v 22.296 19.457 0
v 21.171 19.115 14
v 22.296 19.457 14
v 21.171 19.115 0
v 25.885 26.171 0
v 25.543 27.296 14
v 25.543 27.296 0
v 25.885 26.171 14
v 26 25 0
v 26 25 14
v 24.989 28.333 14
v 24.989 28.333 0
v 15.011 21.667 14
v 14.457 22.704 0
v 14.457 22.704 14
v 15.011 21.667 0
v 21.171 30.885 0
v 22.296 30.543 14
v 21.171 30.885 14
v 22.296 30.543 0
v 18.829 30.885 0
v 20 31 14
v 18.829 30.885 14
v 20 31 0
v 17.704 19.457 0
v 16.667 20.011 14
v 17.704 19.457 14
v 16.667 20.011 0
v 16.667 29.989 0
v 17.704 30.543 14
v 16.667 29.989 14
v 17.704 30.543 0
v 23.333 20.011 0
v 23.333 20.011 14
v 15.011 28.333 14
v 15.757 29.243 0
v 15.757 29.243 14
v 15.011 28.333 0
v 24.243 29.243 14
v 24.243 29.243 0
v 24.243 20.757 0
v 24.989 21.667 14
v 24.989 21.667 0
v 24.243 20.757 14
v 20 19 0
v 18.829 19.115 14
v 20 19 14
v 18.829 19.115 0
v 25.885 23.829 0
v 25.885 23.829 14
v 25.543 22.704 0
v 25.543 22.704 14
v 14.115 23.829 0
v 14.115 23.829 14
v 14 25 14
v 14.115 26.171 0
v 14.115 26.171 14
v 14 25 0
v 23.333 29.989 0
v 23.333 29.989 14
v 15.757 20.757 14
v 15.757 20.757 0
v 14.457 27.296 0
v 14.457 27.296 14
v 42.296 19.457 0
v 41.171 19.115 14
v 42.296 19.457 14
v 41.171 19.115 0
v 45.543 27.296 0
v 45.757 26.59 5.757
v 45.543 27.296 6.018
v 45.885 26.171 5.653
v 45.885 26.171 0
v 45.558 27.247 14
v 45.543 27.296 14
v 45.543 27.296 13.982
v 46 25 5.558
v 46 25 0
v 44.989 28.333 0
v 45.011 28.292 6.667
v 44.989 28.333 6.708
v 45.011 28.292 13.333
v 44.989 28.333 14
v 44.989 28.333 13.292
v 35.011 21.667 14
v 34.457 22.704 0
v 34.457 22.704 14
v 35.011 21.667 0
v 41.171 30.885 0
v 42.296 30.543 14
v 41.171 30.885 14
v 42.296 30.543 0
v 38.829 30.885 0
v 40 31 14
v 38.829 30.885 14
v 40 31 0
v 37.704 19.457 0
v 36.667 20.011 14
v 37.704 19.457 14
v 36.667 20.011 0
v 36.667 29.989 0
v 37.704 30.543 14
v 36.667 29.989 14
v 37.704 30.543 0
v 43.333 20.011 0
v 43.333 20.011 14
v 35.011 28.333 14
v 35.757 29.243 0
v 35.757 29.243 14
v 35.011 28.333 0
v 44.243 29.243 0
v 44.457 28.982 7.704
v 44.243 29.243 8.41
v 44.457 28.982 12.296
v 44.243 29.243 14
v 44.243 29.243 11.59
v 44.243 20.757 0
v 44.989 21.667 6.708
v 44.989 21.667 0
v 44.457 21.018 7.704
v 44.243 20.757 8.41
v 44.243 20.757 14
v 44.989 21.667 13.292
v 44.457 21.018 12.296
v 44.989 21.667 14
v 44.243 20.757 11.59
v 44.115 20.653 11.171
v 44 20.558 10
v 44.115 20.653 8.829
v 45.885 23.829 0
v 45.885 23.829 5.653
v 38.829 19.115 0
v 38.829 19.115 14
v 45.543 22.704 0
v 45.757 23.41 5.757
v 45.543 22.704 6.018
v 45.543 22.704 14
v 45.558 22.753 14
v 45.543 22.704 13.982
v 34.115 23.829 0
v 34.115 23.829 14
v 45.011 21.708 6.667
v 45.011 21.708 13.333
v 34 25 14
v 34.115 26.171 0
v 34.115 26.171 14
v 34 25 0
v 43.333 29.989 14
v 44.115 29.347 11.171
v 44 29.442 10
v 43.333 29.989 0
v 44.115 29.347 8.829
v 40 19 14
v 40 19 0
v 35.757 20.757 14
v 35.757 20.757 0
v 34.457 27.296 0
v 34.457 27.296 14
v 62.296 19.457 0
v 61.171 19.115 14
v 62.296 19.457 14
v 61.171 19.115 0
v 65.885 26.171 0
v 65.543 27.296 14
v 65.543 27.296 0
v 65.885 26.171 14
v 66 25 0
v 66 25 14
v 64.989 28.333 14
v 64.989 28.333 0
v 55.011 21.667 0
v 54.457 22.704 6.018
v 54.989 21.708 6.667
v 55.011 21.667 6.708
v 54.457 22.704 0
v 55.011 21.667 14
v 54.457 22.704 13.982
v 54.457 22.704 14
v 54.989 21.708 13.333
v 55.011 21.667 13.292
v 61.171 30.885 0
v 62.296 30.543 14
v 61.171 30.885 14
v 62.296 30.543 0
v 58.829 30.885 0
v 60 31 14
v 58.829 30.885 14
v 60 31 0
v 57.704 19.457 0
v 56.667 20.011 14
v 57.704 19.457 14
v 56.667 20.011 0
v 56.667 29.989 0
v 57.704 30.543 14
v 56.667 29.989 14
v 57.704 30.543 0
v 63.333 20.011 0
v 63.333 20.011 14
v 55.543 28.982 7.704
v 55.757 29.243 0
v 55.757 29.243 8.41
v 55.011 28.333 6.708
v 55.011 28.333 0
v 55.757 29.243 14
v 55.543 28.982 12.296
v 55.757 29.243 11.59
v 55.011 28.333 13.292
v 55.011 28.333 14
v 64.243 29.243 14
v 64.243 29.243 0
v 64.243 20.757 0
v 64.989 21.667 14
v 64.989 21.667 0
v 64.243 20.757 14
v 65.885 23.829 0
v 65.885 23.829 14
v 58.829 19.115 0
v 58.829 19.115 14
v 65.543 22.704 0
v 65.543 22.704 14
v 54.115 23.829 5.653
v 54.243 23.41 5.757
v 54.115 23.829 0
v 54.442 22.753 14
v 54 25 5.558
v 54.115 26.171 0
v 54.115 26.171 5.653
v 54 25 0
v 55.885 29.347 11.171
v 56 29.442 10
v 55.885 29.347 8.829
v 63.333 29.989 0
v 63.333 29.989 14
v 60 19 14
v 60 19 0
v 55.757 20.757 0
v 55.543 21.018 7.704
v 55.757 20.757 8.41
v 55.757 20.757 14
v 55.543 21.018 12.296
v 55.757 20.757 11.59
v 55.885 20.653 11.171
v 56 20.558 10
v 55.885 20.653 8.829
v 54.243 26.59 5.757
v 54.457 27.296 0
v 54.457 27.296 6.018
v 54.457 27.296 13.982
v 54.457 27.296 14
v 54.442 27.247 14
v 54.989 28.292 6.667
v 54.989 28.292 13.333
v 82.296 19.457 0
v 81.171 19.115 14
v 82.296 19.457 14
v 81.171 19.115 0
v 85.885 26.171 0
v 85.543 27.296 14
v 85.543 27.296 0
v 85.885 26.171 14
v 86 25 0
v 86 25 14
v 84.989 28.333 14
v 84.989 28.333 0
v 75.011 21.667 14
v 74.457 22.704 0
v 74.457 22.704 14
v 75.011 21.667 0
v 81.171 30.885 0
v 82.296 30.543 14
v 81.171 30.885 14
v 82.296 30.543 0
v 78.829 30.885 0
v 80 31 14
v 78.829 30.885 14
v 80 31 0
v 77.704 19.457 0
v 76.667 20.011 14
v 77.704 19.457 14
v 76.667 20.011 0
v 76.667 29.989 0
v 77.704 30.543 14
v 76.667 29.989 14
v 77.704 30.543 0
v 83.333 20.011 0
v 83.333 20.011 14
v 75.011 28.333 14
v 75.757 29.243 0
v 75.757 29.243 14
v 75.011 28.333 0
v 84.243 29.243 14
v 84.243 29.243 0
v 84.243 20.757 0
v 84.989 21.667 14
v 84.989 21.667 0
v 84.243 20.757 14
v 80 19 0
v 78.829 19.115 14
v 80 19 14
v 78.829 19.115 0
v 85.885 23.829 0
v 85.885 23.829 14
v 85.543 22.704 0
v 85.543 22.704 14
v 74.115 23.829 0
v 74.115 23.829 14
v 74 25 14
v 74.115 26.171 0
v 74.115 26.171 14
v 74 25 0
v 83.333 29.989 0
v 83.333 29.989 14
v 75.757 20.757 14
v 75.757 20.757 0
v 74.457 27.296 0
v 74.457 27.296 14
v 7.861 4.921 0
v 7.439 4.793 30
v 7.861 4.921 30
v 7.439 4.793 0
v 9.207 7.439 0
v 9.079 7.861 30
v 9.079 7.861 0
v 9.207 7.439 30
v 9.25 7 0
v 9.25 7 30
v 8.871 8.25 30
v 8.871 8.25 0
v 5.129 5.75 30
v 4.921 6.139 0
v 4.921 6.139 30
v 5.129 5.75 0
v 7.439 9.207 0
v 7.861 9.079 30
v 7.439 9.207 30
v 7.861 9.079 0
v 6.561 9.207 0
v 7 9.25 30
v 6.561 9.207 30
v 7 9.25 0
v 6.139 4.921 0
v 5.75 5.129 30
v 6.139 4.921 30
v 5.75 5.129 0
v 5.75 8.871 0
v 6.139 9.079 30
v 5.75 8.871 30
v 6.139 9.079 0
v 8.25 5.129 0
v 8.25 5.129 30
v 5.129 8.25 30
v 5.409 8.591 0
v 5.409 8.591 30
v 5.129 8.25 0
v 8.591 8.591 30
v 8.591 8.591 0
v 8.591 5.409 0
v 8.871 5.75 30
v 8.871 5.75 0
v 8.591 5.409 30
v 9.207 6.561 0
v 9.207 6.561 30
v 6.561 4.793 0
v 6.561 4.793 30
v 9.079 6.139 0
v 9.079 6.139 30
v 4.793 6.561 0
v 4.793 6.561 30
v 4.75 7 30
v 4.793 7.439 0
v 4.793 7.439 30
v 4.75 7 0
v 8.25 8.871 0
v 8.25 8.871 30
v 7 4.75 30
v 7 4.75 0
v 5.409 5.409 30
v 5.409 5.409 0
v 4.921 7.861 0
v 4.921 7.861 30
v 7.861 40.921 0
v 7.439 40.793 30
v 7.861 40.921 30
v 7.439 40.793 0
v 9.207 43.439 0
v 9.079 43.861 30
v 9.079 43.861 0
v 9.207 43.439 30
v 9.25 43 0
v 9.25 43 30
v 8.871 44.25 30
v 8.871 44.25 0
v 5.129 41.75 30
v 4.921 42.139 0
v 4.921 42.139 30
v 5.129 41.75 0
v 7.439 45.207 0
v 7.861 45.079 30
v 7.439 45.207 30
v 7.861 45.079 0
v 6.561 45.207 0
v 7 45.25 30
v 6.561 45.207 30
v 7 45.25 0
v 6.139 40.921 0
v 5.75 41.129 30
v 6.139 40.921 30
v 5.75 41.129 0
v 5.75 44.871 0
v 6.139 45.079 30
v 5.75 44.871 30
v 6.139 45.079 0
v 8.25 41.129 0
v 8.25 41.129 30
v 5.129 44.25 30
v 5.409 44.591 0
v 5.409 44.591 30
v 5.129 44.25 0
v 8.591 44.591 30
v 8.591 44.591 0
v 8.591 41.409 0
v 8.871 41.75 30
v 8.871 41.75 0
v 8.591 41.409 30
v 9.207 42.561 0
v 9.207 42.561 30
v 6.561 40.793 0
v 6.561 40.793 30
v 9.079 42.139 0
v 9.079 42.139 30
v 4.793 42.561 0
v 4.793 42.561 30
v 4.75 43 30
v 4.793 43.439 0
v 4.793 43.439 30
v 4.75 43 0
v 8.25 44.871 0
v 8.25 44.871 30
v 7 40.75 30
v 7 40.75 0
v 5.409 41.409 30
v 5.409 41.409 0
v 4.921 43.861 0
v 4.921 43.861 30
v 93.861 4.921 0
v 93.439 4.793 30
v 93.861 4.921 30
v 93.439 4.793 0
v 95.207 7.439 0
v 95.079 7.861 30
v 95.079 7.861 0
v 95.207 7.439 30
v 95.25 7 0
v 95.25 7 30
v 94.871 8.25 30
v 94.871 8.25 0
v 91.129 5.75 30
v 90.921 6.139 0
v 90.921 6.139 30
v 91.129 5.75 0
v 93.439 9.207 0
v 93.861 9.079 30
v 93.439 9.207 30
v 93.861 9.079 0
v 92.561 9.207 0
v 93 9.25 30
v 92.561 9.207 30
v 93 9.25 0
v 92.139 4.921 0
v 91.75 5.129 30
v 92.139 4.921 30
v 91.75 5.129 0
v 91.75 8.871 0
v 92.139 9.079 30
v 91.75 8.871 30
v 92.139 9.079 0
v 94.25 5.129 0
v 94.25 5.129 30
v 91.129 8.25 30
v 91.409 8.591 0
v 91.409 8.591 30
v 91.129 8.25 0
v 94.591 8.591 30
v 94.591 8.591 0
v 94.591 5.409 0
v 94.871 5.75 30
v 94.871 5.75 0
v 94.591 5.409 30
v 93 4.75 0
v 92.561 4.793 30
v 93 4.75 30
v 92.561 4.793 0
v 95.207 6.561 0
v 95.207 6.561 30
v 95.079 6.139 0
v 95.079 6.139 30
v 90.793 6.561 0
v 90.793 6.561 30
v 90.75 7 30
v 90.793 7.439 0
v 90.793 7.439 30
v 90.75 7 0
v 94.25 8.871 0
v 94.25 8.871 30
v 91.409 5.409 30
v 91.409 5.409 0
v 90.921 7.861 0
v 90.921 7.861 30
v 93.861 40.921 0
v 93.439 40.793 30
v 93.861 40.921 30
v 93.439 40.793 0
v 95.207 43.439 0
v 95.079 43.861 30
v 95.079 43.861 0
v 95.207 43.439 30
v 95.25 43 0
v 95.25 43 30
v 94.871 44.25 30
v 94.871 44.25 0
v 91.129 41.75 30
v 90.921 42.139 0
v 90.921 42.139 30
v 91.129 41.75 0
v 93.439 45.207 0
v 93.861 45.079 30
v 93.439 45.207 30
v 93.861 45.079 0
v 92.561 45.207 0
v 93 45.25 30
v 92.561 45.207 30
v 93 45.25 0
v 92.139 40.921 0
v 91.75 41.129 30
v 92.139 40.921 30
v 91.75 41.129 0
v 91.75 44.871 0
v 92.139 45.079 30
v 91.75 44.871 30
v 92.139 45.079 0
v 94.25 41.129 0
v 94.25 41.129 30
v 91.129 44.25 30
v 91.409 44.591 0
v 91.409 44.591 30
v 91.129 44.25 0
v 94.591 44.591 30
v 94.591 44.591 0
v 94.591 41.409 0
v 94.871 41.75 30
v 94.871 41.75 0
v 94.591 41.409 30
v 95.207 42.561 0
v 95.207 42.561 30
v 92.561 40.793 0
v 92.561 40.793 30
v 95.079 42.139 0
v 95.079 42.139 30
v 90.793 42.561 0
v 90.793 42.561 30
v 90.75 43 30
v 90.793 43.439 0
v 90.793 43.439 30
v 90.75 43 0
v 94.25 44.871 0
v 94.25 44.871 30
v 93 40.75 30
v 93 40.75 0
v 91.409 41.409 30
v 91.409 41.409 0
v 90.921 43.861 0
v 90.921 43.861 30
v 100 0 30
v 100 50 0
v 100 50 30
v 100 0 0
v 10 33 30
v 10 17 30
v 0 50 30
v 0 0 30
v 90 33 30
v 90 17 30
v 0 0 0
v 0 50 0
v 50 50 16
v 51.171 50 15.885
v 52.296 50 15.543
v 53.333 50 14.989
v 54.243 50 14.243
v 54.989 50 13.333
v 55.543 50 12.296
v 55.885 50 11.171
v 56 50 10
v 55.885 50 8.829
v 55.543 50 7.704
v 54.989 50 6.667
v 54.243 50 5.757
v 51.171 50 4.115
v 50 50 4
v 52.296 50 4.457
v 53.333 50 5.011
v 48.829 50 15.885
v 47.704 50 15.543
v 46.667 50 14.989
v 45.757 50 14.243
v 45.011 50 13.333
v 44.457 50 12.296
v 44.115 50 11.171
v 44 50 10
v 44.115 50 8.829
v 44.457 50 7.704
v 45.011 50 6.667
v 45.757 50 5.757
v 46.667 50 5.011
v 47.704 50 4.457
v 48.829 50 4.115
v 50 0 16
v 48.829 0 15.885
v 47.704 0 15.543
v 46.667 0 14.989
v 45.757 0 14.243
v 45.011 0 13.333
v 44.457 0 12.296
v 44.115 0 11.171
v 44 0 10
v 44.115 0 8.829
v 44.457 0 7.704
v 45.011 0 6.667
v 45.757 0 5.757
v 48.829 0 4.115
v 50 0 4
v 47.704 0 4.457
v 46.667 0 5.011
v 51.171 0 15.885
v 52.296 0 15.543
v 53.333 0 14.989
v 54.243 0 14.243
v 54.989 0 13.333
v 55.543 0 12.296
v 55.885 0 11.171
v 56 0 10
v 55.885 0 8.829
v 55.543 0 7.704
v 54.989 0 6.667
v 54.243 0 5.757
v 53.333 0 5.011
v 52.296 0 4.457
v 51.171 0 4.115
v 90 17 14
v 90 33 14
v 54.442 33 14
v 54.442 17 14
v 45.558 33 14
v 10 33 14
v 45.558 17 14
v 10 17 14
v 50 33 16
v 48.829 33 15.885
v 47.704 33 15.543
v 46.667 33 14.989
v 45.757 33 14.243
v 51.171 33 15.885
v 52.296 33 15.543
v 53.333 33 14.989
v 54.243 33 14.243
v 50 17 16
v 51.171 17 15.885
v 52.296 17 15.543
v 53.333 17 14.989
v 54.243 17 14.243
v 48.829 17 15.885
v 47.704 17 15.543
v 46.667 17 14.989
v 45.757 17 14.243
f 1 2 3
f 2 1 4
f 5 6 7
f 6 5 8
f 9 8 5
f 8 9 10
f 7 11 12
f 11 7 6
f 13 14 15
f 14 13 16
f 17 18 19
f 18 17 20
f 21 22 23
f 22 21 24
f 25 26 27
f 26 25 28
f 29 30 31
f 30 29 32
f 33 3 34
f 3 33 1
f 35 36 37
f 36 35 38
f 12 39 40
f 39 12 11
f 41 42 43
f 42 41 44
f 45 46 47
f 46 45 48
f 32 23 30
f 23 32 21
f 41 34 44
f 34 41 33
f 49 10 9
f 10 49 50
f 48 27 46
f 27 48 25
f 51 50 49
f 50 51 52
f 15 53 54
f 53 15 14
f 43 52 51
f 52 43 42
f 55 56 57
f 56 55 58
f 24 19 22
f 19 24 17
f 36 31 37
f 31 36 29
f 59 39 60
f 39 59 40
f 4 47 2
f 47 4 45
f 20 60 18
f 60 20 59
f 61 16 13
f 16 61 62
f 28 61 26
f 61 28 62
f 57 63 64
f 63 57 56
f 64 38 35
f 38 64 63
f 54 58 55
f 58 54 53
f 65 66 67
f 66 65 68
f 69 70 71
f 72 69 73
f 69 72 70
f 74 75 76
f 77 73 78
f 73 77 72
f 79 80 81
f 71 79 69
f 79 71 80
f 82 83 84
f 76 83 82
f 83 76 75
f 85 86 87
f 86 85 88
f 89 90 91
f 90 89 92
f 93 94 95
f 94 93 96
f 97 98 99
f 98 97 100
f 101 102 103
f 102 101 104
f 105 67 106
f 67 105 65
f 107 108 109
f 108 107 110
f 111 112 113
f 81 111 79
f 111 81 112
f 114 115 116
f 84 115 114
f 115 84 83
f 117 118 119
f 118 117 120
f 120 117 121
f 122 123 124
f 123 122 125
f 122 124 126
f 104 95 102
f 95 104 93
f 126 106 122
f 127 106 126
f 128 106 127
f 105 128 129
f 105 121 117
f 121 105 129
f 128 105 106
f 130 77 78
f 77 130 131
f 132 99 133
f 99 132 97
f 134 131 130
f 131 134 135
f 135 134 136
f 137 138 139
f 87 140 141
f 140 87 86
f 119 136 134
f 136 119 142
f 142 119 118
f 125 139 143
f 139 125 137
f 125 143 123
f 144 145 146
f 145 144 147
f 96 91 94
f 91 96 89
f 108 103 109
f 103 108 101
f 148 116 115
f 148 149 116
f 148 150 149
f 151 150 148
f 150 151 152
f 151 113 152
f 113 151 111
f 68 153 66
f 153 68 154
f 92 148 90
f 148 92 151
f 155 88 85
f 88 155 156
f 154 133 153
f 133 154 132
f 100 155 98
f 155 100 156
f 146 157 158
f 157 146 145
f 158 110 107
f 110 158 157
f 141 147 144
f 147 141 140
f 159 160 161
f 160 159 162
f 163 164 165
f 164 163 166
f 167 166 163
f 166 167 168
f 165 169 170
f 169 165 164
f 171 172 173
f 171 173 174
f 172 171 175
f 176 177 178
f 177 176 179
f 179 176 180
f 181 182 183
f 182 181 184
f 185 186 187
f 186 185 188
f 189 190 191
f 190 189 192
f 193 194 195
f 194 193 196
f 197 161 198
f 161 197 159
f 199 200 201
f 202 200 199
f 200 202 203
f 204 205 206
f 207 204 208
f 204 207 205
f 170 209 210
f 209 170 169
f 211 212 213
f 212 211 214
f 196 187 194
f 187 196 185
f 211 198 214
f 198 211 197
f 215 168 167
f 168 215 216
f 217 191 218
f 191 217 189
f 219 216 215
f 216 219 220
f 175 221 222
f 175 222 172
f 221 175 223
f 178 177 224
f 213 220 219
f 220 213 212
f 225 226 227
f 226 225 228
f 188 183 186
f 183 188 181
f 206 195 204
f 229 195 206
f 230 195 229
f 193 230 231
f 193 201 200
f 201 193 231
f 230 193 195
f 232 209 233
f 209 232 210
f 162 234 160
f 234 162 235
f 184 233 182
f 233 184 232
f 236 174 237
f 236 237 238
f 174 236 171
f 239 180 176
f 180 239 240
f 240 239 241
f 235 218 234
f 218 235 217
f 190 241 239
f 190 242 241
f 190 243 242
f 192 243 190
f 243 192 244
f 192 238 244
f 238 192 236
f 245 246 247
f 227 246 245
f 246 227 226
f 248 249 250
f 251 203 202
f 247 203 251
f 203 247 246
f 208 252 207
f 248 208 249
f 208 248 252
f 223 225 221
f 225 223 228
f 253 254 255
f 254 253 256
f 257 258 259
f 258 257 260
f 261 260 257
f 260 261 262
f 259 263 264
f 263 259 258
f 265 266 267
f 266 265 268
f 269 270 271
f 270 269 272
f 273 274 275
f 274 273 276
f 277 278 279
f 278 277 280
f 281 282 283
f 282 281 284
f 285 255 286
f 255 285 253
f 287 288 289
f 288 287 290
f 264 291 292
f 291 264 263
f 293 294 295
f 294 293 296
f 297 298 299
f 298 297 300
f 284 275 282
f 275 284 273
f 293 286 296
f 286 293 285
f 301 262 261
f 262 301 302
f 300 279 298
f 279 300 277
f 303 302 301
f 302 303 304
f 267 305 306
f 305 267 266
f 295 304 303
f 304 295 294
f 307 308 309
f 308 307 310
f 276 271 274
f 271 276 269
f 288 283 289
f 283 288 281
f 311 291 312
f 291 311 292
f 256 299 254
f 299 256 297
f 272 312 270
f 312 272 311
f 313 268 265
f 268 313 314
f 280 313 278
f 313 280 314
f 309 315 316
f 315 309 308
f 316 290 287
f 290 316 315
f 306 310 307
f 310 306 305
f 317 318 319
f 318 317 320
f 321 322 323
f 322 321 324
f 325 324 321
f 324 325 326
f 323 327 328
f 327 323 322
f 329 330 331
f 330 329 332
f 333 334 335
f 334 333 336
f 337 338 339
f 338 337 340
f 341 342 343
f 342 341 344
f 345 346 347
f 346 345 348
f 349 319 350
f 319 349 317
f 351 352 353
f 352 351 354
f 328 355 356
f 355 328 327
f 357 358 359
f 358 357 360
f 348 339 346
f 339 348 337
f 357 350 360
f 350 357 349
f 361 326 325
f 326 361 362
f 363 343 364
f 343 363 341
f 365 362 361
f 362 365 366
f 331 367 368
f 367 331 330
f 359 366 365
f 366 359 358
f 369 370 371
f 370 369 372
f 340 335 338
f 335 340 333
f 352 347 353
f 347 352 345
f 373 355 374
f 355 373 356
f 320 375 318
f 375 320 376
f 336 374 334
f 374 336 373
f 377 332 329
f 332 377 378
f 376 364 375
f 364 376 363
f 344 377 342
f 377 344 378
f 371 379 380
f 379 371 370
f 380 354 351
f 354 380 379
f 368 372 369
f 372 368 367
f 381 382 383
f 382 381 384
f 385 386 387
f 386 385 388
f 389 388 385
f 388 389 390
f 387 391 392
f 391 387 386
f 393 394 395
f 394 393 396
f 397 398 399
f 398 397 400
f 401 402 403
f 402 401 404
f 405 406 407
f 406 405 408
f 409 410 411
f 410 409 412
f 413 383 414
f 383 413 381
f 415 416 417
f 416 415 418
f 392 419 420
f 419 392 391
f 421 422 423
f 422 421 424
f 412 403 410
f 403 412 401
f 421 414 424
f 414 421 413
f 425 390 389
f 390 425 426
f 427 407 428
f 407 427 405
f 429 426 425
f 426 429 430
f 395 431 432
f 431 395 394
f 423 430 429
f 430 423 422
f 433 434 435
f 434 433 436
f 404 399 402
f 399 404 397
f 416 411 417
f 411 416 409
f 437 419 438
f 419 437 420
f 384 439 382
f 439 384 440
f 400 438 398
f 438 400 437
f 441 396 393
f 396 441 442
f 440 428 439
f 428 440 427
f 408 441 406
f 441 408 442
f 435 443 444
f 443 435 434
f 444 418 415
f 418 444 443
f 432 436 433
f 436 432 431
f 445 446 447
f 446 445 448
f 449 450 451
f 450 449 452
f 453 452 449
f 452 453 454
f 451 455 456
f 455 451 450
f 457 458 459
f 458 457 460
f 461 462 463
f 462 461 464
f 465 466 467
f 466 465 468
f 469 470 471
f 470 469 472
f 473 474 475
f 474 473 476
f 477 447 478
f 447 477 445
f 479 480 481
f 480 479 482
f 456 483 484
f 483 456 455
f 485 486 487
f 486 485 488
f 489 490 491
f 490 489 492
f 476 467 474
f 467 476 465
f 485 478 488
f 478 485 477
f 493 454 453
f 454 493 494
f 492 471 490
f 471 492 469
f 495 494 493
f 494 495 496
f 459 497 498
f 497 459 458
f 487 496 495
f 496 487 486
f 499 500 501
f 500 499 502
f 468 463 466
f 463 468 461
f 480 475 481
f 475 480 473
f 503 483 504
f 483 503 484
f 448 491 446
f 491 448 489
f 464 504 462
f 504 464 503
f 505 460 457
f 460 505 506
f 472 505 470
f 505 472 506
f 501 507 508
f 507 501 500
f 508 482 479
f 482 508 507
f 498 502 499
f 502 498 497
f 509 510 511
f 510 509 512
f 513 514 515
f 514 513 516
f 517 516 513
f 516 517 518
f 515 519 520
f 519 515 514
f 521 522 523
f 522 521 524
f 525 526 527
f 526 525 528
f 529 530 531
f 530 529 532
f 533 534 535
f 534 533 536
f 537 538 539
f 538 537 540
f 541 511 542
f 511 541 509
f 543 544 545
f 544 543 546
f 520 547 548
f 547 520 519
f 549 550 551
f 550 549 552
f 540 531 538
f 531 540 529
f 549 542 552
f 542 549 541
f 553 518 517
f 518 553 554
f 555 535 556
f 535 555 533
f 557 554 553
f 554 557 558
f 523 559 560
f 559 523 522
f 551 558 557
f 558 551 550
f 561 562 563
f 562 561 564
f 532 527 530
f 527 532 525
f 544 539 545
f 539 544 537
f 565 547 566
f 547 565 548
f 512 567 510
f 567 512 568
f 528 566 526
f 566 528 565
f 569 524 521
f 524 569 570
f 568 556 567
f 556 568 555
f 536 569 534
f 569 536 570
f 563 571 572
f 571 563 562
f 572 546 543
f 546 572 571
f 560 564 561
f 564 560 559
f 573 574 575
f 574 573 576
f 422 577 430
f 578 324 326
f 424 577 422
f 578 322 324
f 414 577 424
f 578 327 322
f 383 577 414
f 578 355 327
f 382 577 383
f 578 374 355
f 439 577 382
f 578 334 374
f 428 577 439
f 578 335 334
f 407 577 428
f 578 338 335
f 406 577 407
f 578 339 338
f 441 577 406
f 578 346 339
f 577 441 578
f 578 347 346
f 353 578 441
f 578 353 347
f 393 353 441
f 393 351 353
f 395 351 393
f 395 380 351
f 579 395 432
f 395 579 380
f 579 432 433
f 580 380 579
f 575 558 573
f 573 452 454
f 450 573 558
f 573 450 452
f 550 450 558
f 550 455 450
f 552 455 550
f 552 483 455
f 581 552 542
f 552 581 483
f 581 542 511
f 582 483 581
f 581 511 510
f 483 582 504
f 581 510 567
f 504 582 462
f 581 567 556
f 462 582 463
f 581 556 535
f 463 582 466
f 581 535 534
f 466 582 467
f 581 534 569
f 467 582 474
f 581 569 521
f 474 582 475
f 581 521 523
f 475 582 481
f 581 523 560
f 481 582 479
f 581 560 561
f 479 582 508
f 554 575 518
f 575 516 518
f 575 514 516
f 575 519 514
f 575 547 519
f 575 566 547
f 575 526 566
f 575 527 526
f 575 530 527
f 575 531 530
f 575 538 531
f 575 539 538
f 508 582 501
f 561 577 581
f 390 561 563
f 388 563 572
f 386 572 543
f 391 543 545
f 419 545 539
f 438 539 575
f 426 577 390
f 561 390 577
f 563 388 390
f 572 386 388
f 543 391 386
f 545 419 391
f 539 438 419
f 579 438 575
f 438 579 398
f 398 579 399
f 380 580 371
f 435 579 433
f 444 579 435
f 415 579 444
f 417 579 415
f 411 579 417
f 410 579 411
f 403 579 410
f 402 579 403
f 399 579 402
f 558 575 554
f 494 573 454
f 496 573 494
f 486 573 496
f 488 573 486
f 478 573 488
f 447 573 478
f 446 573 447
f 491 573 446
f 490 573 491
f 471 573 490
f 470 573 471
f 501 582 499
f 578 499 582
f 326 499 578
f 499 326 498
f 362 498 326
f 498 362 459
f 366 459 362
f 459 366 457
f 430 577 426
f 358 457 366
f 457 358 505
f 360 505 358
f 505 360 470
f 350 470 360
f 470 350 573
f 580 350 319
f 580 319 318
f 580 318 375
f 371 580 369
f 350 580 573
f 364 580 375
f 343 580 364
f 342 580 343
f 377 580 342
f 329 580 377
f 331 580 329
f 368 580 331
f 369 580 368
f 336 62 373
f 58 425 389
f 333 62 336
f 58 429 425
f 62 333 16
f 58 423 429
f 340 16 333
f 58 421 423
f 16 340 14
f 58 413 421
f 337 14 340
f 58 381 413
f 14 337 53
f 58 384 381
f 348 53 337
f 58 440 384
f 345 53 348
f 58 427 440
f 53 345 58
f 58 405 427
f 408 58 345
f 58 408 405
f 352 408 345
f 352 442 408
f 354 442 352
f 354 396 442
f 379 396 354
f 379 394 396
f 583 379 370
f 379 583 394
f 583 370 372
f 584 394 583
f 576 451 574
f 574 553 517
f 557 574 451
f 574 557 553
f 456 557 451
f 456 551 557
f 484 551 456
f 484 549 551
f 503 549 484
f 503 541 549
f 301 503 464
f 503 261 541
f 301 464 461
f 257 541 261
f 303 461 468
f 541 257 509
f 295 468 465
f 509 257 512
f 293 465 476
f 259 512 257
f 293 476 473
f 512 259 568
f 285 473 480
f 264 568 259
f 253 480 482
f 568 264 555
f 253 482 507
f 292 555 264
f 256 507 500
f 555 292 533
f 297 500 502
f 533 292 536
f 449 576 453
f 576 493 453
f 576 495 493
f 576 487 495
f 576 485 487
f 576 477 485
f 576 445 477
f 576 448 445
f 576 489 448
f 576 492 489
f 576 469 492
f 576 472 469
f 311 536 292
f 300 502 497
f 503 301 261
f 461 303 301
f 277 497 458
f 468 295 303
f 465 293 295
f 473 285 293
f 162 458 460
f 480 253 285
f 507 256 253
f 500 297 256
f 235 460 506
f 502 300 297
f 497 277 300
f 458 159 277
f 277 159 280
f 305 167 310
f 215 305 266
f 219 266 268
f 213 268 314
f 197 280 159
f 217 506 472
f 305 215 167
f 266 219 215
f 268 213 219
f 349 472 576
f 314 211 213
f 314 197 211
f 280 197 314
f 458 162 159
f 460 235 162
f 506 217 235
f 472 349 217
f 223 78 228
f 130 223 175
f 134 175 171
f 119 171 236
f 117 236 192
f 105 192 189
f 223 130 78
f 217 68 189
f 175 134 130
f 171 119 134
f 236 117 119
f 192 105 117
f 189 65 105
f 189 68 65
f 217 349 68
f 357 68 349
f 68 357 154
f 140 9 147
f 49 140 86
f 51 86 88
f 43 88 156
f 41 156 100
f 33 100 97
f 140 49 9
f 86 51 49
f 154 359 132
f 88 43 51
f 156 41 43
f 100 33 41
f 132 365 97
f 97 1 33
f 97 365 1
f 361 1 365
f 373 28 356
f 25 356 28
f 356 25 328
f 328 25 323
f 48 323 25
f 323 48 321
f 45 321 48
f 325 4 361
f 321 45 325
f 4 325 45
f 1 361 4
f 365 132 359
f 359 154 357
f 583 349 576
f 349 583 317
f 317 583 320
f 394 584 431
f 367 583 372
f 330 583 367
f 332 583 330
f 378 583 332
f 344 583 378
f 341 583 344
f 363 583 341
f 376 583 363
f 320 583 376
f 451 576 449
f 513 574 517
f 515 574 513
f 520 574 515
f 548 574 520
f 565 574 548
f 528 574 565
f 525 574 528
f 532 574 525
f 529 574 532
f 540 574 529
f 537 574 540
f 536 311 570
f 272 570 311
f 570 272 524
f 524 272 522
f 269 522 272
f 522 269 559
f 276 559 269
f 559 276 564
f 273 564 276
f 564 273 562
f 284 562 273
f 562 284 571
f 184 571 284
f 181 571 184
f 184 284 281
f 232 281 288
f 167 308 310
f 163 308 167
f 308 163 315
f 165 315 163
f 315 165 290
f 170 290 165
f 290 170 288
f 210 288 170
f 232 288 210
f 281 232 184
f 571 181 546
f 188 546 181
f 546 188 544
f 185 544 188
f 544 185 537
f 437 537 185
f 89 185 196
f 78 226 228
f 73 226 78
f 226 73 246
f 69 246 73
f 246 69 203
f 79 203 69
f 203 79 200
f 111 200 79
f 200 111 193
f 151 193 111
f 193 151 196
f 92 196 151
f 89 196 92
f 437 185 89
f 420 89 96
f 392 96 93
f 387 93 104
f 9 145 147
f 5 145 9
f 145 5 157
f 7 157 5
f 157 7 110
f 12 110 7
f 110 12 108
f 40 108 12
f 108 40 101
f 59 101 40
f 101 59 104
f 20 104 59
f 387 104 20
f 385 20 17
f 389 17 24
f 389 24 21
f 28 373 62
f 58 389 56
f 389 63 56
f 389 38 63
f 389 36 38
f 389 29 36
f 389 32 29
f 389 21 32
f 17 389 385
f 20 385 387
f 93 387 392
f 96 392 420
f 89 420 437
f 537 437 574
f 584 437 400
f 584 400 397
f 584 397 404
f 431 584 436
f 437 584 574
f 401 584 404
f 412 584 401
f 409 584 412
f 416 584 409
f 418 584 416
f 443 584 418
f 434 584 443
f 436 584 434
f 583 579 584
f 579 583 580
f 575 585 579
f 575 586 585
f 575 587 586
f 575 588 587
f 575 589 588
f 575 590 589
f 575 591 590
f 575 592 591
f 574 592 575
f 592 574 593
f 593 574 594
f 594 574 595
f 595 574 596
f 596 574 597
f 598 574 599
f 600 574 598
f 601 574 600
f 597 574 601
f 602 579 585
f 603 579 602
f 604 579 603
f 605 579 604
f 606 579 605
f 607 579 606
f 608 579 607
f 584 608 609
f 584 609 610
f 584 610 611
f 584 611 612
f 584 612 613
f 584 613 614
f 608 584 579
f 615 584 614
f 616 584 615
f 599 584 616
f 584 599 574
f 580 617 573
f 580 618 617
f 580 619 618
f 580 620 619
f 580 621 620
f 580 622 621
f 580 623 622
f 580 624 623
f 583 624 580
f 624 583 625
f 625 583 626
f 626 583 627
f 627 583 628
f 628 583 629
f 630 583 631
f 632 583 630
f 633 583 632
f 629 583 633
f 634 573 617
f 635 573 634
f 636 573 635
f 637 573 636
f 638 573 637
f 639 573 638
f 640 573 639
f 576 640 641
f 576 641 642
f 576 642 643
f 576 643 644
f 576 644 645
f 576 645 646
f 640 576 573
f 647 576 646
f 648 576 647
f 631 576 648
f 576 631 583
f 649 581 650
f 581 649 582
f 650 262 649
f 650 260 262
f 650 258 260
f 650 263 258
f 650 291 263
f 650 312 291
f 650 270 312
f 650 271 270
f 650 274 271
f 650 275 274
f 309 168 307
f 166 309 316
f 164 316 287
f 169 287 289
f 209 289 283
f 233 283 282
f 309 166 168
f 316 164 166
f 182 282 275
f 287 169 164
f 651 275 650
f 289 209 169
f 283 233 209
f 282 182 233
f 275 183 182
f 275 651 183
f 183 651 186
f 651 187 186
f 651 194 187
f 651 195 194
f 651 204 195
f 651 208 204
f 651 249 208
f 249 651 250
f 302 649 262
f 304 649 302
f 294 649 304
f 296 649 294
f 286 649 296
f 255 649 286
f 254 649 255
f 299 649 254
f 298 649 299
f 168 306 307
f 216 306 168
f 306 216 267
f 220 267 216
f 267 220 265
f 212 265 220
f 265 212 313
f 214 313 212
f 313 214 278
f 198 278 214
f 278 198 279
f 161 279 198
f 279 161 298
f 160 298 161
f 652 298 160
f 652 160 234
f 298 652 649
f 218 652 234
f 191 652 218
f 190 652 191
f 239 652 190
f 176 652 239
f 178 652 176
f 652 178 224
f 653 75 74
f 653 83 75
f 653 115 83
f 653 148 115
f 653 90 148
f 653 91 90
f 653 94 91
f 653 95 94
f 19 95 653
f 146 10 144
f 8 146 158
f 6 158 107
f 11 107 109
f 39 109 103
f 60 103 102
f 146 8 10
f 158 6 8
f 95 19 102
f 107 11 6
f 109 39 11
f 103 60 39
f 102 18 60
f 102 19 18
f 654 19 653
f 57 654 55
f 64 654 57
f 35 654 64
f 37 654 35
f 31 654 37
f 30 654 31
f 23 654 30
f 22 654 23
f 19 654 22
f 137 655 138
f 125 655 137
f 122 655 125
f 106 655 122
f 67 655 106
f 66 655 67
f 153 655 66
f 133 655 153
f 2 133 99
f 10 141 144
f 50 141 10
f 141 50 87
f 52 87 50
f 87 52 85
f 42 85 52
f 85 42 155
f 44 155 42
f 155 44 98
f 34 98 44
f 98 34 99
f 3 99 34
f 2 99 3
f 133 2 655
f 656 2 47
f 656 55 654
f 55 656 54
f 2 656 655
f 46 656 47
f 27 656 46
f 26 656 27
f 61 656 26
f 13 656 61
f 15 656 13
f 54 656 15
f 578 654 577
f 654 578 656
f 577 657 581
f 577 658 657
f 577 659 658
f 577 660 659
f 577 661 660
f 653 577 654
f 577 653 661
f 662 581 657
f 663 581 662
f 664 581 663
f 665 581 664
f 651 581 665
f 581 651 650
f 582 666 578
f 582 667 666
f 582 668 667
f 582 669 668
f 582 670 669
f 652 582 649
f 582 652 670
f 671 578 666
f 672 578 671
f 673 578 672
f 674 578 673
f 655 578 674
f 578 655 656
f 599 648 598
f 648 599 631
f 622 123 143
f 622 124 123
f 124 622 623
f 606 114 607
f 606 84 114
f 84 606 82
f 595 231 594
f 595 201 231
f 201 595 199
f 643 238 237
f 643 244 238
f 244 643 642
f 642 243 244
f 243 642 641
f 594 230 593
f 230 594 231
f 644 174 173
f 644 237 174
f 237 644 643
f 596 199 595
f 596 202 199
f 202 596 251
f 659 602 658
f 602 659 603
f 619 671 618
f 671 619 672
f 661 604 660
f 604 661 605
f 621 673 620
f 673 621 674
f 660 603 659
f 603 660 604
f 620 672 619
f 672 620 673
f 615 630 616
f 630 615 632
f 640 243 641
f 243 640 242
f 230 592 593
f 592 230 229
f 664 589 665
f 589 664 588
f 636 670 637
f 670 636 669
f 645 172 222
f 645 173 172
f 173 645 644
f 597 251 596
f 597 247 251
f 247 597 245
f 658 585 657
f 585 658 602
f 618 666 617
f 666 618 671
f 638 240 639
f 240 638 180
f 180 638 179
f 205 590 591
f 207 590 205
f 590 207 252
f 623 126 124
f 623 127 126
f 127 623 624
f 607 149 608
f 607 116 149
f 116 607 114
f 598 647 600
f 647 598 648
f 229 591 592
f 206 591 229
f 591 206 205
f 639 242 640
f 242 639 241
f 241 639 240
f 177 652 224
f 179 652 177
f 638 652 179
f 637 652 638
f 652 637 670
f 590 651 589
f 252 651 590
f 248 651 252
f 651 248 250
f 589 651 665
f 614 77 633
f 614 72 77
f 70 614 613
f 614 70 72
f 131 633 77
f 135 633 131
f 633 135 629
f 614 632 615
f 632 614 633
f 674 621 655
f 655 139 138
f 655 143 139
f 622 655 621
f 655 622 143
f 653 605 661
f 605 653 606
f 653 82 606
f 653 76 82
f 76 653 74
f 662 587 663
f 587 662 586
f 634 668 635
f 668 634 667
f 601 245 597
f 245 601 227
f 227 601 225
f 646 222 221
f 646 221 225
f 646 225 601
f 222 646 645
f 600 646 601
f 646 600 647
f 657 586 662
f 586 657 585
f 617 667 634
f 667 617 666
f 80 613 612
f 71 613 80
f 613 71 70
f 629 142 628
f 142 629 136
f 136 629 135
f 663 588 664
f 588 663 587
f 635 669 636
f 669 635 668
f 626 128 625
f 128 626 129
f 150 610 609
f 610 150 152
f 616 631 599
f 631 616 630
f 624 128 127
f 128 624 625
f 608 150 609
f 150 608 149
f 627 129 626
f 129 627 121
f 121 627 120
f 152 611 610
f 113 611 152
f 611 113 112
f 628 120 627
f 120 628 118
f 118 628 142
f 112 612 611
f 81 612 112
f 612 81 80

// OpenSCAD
$fn = 32;

// ----------------------------------------------------------------------
// Manifold block: side_outlet manifold
// ----------------------------------------------------------------------

// --- parameters (mm) ---
block_l = 100;            // block length, X
block_w = 50;             // block width, Y
block_h = 30;             // block height, Z
port_d = 12;              // port bore diameter
port_pitch = 20;          // port pitch along X
gallery_d = 16;           // top gallery width, Y
gallery_depth = 16;       // gallery pocket depth
wall_p = 10;              // gallery end wall thickness, X
mnt_d = 4.5;              // mounting hole diameter
mnt_in = 7;               // mounting hole inset from the edges
out_d = 12;               // outlet bore diameter
out_z = 10;               // outlet axis height

n_ports = 4;  // ports in the row
port_x0 = (block_l - (n_ports - 1) * port_pitch) / 2;  // first port X

difference() {
  cube([block_l, block_w, block_h]);
  for (i = [0 : n_ports - 1])
    translate([port_x0 + i * port_pitch, block_w / 2, -1])
      cylinder(h = block_h + 2, d = port_d);
  translate([wall_p, block_w / 2 - gallery_d / 2, block_h - gallery_depth])
    cube([block_l - 2 * wall_p, gallery_d, gallery_depth + 1]);
  for (cx = [mnt_in, block_l - mnt_in])
    for (cy = [mnt_in, block_w - mnt_in])
      translate([cx, cy, -1]) cylinder(h = block_h + 2, d = mnt_d);
  translate([block_l / 2, -1, out_z]) rotate([-90, 0, 0])
    cylinder(h = block_w + 2, d = out_d);
}
